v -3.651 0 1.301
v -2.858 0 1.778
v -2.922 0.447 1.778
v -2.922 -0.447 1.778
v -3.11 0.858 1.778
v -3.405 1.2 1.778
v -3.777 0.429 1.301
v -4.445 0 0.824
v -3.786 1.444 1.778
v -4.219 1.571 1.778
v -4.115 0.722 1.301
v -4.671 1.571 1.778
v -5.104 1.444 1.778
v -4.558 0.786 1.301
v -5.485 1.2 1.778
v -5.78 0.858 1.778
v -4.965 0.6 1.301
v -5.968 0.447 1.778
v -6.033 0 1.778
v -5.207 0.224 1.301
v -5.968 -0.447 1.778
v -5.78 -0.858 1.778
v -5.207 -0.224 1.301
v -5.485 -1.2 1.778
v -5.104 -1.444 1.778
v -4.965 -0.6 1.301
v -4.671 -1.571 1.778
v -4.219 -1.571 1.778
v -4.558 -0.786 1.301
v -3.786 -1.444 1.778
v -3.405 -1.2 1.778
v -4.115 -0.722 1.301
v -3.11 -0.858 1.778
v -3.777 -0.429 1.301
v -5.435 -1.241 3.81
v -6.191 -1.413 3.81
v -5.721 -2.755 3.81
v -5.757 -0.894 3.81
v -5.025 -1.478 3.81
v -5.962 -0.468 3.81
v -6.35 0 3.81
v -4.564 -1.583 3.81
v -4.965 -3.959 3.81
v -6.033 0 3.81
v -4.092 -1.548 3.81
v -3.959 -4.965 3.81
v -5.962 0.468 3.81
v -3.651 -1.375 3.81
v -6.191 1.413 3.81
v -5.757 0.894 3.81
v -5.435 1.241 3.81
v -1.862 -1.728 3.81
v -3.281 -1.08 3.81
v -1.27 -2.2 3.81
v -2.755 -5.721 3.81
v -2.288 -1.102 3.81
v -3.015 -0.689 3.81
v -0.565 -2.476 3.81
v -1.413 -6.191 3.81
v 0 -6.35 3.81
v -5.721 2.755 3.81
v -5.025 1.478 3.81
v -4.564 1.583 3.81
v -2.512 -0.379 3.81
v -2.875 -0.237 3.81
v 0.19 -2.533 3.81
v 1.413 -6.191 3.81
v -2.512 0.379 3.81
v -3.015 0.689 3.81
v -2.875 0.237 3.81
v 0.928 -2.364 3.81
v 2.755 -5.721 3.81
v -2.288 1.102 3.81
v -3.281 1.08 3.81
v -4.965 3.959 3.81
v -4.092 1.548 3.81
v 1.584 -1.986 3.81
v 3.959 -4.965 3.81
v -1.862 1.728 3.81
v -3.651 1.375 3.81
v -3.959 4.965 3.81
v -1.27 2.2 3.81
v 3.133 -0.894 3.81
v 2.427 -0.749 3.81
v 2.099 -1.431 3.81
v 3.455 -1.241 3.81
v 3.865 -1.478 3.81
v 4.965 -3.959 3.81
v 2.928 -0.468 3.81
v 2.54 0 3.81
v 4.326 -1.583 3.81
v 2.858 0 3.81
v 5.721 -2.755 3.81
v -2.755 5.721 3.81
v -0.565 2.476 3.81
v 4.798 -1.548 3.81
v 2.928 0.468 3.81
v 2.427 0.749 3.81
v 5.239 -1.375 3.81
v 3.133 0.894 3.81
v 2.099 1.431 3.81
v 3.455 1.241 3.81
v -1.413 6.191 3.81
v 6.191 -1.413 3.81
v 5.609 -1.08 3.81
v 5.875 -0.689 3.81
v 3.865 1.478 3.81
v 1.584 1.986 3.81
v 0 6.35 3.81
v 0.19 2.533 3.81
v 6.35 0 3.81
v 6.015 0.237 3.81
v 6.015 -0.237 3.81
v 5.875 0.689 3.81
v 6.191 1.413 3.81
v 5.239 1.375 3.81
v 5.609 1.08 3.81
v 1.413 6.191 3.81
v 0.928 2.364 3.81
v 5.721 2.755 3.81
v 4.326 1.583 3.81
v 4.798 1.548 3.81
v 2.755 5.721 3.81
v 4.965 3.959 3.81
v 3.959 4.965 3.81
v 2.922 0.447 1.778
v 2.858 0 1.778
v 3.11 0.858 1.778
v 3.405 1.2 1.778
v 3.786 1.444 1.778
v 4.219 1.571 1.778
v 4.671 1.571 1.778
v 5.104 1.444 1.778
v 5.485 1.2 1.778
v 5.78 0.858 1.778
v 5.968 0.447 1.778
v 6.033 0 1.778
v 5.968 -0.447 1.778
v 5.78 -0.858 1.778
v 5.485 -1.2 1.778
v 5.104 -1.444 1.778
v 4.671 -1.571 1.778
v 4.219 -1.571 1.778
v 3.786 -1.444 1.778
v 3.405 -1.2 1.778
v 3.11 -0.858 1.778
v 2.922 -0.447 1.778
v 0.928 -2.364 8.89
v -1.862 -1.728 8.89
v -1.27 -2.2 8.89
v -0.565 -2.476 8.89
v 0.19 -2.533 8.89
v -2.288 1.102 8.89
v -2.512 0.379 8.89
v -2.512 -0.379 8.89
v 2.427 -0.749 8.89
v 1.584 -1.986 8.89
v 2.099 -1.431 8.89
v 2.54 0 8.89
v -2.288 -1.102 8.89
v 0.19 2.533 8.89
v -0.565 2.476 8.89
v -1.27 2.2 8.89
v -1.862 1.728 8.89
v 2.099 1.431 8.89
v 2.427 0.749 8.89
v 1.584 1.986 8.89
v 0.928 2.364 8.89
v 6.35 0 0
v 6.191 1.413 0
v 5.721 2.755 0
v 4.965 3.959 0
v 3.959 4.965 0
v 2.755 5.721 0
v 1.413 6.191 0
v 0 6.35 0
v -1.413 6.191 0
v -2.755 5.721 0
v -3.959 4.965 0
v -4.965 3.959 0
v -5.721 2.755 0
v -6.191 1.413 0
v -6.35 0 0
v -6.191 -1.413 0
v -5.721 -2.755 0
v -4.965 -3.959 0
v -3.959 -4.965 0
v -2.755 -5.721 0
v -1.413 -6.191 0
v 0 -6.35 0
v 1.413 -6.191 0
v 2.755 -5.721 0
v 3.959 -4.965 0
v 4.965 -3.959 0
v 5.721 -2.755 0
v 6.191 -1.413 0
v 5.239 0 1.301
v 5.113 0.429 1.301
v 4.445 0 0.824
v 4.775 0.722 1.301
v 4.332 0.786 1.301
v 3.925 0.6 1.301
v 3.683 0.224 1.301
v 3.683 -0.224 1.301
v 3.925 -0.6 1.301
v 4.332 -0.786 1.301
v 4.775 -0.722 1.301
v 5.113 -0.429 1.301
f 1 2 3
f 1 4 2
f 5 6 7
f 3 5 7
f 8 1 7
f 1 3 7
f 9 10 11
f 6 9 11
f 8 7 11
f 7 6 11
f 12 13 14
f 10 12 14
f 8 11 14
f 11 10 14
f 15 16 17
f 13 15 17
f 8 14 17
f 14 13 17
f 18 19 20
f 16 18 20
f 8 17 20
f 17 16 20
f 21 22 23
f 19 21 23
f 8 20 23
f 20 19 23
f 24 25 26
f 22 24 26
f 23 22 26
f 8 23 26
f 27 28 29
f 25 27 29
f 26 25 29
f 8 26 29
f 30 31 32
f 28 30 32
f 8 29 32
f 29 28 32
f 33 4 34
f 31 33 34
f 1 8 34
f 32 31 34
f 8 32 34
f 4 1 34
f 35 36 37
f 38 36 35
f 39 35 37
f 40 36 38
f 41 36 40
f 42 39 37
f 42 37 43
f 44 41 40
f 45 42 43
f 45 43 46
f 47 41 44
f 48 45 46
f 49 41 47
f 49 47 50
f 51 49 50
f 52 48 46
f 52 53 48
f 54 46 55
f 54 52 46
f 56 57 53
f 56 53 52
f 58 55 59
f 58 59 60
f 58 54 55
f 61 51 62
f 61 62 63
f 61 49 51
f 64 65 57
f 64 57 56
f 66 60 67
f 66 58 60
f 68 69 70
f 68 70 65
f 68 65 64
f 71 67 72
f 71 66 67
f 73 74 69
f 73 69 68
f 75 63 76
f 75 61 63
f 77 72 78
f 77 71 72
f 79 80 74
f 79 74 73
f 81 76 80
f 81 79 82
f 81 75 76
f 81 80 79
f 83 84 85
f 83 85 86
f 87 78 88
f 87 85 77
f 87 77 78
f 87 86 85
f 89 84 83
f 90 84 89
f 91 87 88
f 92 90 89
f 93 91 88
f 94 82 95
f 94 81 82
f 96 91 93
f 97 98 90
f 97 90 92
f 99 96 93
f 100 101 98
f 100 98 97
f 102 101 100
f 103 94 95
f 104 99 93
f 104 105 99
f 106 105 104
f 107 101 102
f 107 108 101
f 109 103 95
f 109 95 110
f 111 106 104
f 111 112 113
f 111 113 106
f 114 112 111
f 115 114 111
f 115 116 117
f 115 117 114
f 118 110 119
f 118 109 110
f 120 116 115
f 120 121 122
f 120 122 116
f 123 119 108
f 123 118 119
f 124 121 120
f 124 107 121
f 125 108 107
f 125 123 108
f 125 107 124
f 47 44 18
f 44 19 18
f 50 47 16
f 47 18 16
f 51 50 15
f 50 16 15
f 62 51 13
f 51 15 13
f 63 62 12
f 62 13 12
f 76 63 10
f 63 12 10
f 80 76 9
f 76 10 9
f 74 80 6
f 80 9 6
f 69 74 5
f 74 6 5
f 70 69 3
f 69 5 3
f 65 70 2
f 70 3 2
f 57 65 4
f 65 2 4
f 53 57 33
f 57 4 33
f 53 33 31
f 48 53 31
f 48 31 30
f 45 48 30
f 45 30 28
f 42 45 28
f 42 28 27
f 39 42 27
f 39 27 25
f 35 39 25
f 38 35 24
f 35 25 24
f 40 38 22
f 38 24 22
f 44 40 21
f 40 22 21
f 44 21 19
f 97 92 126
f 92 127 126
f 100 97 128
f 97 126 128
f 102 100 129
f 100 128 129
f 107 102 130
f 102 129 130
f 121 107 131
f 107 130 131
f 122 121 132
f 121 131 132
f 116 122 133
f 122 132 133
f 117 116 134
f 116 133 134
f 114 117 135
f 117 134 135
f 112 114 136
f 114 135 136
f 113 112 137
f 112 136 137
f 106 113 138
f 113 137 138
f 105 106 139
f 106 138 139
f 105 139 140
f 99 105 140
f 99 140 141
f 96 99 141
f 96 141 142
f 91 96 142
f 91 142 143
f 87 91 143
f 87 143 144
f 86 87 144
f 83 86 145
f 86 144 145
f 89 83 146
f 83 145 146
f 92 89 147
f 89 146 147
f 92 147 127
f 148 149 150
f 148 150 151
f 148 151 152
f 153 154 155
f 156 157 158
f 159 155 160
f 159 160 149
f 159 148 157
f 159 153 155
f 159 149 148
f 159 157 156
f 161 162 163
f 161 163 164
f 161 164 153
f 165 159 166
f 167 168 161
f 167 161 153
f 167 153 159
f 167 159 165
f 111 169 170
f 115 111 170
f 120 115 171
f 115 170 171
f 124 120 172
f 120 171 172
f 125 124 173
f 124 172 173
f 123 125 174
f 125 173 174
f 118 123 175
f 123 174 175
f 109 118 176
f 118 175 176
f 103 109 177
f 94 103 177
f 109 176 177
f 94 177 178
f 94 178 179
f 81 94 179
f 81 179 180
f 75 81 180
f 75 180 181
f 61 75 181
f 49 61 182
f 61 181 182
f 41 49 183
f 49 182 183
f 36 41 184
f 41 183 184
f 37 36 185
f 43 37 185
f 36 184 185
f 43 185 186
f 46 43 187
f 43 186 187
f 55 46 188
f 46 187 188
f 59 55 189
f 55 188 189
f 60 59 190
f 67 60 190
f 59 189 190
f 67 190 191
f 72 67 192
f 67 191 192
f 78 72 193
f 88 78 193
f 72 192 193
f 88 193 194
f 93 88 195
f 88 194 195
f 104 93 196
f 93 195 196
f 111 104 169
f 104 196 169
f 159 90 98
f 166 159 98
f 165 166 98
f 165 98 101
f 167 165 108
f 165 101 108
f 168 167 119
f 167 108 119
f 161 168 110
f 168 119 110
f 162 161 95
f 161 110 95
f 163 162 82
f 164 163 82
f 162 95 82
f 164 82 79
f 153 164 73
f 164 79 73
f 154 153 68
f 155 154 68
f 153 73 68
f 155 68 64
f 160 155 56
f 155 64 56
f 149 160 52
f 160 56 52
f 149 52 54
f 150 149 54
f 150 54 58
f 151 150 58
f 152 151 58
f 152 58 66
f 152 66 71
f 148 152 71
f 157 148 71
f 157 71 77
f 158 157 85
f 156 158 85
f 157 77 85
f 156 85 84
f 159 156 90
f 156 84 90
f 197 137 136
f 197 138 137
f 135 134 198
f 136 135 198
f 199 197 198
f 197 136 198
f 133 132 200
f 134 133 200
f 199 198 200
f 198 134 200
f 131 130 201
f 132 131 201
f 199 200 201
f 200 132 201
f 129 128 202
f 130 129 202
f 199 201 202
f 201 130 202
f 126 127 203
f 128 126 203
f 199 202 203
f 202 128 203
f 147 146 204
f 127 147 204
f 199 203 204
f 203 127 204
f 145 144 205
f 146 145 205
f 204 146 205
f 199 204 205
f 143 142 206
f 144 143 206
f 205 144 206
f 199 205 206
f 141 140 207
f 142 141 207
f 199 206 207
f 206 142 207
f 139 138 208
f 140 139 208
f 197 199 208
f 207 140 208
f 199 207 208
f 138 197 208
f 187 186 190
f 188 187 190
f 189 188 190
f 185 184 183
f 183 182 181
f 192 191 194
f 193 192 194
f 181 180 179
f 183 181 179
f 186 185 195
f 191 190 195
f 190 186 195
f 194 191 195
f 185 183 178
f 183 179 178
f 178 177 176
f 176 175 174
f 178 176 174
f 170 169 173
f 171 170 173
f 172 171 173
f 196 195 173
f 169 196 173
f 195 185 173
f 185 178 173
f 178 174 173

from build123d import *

# Parameters (mm, degrees)
F0_R     = 6.35
F1_DEPTH = 3.81
F2_R     = 2.54
F3_DEPTH = 5.08
F6_D     = 3.175
F6_DEPTH = 2.032
F6_TIP   = 0.9538662327
F7_D     = 3.175
F7_DEPTH = 2.032
F7_TIP   = 0.9538662327


with BuildPart() as f1:
    # F0 (on Top) → F1 (new body)
    with BuildSketch(Plane.XY):
        Circle(F0_R)
    extrude(amount=F1_DEPTH)

    # F2 (on face) → F3 (join)
    with BuildSketch(Plane.XY.offset(3.81)):
        Circle(F2_R)
    extrude(amount=F3_DEPTH)

    # F6
    with Locations(Plane.XY.offset(3.81)):
        with Locations((-4.445, 0)):
            Hole(F6_D / 2, depth=F6_DEPTH)
            with Locations((0, 0, -(F6_DEPTH + F6_TIP / 2))):  # 118° drill point
                Cone(0, F6_D / 2, F6_TIP, mode=Mode.SUBTRACT)

    # F7
    with Locations(Plane.XY.offset(3.81)):
        with Locations((4.445, 0)):
            Hole(F7_D / 2, depth=F7_DEPTH)
            with Locations((0, 0, -(F7_DEPTH + F7_TIP / 2))):  # 118° drill point
                Cone(0, F7_D / 2, F7_TIP, mode=Mode.SUBTRACT)


solid = f1.part
